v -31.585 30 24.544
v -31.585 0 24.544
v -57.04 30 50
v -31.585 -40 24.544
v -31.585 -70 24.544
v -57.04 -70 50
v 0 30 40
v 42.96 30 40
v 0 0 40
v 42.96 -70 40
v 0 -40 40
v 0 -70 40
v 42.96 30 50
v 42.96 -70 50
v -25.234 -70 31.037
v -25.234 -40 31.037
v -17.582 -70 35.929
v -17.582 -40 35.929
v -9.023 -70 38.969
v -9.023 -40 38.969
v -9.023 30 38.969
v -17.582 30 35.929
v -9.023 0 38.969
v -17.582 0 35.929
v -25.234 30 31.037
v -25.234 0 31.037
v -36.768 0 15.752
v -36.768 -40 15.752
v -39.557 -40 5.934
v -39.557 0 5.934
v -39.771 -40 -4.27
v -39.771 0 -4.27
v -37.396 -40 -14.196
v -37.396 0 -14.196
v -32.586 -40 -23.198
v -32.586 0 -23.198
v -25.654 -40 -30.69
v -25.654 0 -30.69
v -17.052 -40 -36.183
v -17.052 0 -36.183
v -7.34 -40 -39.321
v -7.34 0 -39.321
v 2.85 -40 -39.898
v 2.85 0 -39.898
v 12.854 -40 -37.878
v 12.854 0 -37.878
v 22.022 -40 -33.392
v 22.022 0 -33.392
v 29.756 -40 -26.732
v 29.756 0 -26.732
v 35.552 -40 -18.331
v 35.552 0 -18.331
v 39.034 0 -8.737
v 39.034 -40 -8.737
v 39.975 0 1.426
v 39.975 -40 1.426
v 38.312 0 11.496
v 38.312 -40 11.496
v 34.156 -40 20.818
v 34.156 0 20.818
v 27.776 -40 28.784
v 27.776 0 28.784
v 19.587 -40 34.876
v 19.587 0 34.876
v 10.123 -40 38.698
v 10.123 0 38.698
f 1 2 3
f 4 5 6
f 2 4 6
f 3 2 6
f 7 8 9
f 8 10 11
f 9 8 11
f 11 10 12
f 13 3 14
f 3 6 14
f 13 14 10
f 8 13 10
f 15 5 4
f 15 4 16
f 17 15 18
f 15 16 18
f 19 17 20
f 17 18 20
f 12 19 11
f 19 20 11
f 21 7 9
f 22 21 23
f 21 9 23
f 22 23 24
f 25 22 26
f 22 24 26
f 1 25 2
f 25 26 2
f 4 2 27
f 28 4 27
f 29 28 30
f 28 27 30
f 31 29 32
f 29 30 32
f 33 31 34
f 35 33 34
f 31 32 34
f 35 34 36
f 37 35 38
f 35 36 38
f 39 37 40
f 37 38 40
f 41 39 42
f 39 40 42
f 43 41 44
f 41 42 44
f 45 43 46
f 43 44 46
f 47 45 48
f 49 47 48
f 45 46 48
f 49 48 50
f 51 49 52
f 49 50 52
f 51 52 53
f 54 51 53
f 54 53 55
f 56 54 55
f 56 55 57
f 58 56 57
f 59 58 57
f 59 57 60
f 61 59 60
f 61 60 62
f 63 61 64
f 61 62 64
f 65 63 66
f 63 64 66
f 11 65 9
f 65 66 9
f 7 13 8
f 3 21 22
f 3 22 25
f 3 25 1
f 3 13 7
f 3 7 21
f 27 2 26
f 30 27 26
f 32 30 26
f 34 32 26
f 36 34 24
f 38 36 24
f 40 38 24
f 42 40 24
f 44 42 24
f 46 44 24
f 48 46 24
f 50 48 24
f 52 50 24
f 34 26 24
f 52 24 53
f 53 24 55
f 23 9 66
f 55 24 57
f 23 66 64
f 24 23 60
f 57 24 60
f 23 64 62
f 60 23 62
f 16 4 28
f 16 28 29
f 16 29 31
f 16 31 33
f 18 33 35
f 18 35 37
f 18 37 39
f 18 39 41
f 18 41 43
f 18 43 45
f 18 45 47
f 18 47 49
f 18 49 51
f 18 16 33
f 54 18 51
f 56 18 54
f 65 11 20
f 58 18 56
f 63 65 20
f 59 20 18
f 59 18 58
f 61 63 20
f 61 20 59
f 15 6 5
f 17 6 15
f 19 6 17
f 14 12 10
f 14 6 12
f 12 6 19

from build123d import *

# Parameters (mm, degrees)
F1_DEPTH = 40
F3_DEPTH = 30
F5_DEPTH = 30


with BuildPart() as f1:
    # F0 (on Front) → F1 (new body)
    with BuildSketch(Plane.XZ):
        with BuildLine():
            Line((-57.0404038358, 50), (-31.5845597131, 24.5441558773))
            ThreePointArc((-31.5845597131, 24.5441558773), (17.5817201222, -35.9288619016), (0, 40))
            Line((0, 40), (42.9595961642, 40))
            Line((42.9595961642, 40), (42.9595961642, 50))
            Line((42.9595961642, 50), (-57.0404038358, 50))
        make_face()
    extrude(amount=F1_DEPTH)

    # F2 (on face) → F3 (join)
    with BuildSketch(Plane.XZ.offset(40)):
        with BuildLine():
            ThreePointArc((-31.5845597131, 24.5441558773), (-17.5817201222, 35.9288619016), (0, 40))
            Line((0, 40), (42.9595961642, 40))
            Line((42.9595961642, 40), (42.9595961642, 50))
            Line((42.9595961642, 50), (-57.0404038358, 50))
            Line((-57.0404038358, 50), (-31.5845597131, 24.5441558773))
        make_face()
    extrude(amount=F3_DEPTH)

    # F4 (on face) → F5 (join)
    with BuildSketch(Plane(origin=(0, 0, 0), x_dir=(-1, 0, 0), z_dir=(0, 1, 0))):
        with BuildLine():
            ThreePointArc((0, 40), (17.5817201222, 35.9288619016), (31.5845597131, 24.5441558773))
            Line((31.5845597131, 24.5441558773), (57.0404038358, 50))
            Line((57.0404038358, 50), (-42.9595961642, 50))
            Line((-42.9595961642, 50), (-42.9595961642, 40))
            Line((-42.9595961642, 40), (0, 40))
        make_face()
    extrude(amount=F5_DEPTH)


solid = f1.part
